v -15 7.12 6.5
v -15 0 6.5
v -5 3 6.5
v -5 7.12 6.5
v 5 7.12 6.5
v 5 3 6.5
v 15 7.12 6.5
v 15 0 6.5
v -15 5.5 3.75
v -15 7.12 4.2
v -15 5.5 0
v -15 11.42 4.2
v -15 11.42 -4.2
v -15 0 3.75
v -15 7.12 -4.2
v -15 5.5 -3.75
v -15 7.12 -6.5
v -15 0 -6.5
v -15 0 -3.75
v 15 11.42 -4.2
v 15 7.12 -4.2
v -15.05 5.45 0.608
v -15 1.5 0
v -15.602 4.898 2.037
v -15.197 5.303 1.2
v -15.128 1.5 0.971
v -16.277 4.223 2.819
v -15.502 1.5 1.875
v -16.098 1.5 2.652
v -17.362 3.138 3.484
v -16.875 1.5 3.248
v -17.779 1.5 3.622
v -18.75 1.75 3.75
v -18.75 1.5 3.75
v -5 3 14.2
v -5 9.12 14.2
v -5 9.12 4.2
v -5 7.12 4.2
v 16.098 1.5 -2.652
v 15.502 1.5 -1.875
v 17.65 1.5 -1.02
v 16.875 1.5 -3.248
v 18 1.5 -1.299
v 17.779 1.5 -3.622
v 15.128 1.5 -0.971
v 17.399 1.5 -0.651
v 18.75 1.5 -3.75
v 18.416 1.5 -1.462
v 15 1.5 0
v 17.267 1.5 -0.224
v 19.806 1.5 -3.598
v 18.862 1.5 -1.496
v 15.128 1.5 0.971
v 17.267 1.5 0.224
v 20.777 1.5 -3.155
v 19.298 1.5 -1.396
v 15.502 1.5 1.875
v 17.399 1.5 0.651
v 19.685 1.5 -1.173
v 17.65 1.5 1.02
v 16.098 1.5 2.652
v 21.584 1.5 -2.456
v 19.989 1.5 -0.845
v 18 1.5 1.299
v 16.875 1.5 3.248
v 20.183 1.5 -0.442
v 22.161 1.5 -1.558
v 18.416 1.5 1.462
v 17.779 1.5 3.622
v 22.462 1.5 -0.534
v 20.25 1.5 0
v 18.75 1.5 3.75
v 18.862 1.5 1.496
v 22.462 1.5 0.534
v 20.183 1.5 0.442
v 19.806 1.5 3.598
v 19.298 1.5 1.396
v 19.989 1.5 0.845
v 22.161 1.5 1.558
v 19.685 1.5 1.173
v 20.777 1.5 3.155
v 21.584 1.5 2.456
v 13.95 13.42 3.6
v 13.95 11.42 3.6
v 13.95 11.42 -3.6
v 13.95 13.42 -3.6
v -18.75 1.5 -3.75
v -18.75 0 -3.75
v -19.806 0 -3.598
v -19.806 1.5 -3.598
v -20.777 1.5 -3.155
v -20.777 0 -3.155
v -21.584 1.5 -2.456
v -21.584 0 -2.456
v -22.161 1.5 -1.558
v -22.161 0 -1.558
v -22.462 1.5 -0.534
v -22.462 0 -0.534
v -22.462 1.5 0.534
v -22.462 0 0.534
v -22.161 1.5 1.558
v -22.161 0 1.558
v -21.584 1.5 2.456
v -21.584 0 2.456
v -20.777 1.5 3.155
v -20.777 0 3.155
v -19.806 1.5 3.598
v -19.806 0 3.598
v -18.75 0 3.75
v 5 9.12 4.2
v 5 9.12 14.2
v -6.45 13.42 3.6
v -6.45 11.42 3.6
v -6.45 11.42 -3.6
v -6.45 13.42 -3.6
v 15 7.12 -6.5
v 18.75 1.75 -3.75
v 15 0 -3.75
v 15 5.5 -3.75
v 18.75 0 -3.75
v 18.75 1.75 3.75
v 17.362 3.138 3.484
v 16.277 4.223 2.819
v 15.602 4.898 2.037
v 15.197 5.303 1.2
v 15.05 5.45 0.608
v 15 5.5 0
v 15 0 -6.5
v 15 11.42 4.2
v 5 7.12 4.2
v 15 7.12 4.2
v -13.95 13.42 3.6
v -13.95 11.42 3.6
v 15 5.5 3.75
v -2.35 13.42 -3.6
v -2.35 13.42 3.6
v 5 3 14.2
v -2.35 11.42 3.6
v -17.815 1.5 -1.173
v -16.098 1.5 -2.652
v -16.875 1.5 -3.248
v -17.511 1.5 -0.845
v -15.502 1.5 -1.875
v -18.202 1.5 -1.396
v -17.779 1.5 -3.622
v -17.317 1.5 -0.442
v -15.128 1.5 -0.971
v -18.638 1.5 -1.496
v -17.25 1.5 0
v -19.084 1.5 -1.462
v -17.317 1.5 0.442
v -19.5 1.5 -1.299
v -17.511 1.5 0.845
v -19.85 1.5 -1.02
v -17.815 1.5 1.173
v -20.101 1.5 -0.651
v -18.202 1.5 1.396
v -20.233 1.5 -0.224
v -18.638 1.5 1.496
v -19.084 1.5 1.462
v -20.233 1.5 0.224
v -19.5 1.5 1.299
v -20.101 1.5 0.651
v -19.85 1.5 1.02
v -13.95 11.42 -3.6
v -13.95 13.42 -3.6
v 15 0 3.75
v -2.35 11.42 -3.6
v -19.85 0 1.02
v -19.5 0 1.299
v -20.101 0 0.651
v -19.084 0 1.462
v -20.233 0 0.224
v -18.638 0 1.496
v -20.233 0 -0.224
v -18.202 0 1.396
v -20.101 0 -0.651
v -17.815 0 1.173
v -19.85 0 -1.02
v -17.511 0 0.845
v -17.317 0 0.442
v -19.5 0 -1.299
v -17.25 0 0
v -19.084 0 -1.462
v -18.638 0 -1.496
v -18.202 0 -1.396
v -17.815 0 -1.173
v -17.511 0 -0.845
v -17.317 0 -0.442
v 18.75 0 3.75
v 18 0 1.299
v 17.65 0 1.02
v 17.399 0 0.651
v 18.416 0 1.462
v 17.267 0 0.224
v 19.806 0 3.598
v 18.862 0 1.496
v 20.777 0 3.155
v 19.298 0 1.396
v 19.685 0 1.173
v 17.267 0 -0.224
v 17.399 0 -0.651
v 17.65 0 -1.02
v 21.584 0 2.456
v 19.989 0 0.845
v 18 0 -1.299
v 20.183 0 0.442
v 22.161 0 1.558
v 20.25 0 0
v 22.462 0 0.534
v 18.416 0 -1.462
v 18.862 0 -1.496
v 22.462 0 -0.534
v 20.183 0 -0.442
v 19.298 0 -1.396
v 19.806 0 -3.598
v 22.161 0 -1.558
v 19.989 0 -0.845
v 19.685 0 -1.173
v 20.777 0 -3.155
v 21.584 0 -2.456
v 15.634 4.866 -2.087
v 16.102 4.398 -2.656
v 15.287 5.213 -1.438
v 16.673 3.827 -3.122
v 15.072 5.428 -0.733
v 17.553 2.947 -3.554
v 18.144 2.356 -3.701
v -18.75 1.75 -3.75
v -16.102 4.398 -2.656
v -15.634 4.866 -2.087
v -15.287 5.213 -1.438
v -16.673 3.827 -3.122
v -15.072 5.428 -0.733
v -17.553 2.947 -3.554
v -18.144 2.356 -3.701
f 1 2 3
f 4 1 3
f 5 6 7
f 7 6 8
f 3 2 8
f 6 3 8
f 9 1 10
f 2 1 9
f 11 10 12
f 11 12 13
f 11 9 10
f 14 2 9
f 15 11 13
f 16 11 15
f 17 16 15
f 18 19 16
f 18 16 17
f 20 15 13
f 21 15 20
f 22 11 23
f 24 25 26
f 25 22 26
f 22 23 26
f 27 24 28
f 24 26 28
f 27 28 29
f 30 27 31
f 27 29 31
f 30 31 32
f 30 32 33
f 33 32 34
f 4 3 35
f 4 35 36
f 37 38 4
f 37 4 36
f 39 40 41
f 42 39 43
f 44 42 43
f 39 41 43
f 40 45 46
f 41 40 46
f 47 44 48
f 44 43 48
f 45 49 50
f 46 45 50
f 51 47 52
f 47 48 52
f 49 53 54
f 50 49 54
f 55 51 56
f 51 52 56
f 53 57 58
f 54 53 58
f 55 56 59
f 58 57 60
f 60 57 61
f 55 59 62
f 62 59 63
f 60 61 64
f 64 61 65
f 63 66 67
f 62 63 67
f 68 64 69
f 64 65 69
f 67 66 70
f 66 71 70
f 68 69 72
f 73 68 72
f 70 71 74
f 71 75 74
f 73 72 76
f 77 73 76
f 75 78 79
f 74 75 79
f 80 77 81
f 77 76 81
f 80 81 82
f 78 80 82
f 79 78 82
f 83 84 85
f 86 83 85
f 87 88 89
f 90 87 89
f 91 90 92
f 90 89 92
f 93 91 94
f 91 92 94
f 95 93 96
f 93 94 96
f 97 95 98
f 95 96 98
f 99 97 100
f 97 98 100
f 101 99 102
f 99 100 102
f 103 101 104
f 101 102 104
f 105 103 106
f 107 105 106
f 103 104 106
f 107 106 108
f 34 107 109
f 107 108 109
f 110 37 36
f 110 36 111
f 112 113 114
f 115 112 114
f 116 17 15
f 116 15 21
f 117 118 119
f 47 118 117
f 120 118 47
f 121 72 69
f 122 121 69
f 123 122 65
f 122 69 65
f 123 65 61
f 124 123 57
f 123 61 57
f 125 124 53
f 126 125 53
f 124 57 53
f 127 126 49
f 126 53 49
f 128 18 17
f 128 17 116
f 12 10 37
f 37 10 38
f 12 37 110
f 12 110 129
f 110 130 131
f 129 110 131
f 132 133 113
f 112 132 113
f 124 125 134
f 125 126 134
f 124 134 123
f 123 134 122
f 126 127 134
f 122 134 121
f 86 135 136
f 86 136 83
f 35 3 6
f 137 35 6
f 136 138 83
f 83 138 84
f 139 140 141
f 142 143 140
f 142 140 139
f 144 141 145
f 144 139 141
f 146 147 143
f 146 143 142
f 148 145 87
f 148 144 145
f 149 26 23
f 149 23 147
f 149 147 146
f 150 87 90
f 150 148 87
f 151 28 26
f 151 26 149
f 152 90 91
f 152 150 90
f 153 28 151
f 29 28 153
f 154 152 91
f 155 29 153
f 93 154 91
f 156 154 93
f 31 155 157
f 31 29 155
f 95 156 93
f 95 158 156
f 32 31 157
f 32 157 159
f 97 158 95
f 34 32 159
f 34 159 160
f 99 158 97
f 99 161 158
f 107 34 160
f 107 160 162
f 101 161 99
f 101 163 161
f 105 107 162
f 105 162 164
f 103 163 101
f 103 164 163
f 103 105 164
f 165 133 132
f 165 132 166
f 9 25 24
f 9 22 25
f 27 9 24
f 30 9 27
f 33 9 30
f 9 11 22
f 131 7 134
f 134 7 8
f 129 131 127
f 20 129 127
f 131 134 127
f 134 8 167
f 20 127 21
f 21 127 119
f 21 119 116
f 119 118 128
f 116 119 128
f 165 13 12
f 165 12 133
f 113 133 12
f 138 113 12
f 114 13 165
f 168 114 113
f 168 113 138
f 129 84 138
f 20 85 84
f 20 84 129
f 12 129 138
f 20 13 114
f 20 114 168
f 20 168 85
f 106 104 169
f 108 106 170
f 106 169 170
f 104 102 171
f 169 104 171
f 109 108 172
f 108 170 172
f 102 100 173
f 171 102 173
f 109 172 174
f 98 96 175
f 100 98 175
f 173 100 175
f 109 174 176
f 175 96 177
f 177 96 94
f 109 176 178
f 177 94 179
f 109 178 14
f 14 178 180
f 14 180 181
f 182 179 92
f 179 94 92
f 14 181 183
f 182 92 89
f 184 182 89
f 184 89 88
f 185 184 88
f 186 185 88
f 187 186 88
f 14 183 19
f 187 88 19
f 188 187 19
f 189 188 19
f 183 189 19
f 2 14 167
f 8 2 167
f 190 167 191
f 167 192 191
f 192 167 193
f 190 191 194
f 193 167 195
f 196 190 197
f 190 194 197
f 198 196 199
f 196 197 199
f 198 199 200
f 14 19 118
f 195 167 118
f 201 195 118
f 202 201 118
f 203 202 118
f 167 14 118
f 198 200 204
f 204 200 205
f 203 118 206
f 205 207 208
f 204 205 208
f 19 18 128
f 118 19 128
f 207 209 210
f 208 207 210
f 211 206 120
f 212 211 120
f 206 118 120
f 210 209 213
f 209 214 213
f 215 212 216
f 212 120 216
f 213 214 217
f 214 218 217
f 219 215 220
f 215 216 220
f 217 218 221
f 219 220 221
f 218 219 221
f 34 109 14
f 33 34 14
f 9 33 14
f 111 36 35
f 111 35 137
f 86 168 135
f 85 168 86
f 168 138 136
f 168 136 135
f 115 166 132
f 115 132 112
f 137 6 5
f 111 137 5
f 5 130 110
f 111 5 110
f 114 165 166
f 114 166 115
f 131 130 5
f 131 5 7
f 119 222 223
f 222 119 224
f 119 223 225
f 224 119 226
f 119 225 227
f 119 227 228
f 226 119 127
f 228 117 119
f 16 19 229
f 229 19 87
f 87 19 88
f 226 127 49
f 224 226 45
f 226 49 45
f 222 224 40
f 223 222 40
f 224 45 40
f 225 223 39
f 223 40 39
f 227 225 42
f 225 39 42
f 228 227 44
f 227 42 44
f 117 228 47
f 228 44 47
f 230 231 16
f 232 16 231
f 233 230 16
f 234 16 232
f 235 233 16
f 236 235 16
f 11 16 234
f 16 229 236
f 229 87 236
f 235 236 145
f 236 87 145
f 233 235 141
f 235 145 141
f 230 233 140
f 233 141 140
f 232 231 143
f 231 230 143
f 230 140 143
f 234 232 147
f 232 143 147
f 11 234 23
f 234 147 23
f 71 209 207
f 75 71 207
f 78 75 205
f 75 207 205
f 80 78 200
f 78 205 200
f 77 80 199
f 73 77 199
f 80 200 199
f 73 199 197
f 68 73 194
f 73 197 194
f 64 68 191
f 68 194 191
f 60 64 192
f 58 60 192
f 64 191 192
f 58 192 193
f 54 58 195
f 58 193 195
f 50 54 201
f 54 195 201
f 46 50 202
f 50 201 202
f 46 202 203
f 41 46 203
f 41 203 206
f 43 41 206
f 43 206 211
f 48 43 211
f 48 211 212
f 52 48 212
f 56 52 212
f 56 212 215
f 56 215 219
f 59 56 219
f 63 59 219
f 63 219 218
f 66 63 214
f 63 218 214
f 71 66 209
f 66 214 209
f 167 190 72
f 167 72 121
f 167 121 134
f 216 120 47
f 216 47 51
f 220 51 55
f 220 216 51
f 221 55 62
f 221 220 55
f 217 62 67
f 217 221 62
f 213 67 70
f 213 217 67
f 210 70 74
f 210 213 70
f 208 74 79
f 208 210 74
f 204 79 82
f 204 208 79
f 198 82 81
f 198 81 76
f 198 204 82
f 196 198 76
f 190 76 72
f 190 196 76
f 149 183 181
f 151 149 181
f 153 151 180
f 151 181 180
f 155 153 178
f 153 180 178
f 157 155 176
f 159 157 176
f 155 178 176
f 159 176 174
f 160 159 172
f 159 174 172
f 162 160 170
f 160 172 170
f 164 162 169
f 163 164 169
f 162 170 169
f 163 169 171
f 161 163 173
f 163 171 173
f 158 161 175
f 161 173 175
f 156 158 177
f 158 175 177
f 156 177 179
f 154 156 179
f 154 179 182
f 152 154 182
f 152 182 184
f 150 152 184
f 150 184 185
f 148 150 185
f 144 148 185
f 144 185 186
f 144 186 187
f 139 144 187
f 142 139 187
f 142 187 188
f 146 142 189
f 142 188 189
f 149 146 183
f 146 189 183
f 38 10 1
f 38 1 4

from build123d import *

# Parameters (mm, degrees)
SKETCH1_W            = 30
SKETCH1_H            = 13
BOTTOMPLATEAU_DEPTH  = 7.12
SKETCH3_R            = 1.5
SCREWSOCKETS_DEPTH   = 1.5
SKETCH4_W            = 30
SKETCH4_H            = 8.4
TOPPLATEAU_DEPTH     = 4.3
SKETCH5_W            = 7.5
SKETCH5_H            = 7.2
SKETCH5_W_2          = 16.3
SENSORSOCKETS_DEPTH  = 2
EXTRUDEDSLANTS_DEPTH = 4
F_45SLANTS_DEPTH     = 7.5
CONNECTION_W         = 10
CONNECTION_H         = 6.12
BOSS_EXTRUDE6_DEPTH  = 10


with BuildPart() as part:
    # Sketch1 → BottomPlateau (new body)
    with BuildSketch(Plane(origin=(0, 0, 0), x_dir=(1, 0, 0), z_dir=(0, 1, 0))):
        Rectangle(SKETCH1_W, SKETCH1_H)
    extrude(amount=BOTTOMPLATEAU_DEPTH)

    # Sketch3 → ScrewSockets (add)
    with BuildSketch(Plane.XZ):
        with BuildLine():
            Line((-18.75, 3.75), (-15, 3.75))
            Line((-15, 3.75), (-15, -3.75))
            Line((-15, -3.75), (-18.75, -3.75))
            ThreePointArc((-18.75, -3.75), (-22.5, 0), (-18.75, 3.75))
        make_face()
        with Locations((-18.75, 0)):
            Circle(SKETCH3_R, mode=Mode.SUBTRACT)
        with BuildLine():
            Line((18.75, 3.75), (15, 3.75))
            Line((15, 3.75), (15, -3.75))
            Line((15, -3.75), (18.75, -3.75))
            ThreePointArc((18.75, -3.75), (22.5, 0), (18.75, 3.75))
        make_face()
        with Locations((18.75, 0)):
            Circle(SKETCH3_R, mode=Mode.SUBTRACT)
    extrude(amount=-SCREWSOCKETS_DEPTH)

    # Sketch4 → TopPlateau (add)
    with BuildSketch(Plane(origin=(0, 7.12, 0), x_dir=(1, 0, 0), z_dir=(0, 1, 0))):
        Rectangle(SKETCH4_W, SKETCH4_H)
    extrude(amount=TOPPLATEAU_DEPTH)

    # Sketch5 → SensorSockets (add)
    with BuildSketch(Plane(origin=(0, 11.42, 0), x_dir=(1, 0, 0), z_dir=(0, 1, 0))):
        with Locations((-10.2, 0)):
            Rectangle(SKETCH5_W, SKETCH5_H)
        with Locations((5.8, 0)):
            Rectangle(SKETCH5_W_2, SKETCH5_H)
    extrude(amount=SENSORSOCKETS_DEPTH)

    # Sketch6 → ExtrudedSlants (add)
    with BuildSketch(Plane(origin=(0, 1.5, 0), x_dir=(1, 0, 0), z_dir=(0, 1, 0))):
        with BuildLine():
            Line((-15, -3.75), (-15, 0))
            ThreePointArc((-15, 0), (-16.098349571, -2.651650429), (-18.75, -3.75))
            Line((-18.75, -3.75), (-15, -3.75))
        make_face()
        with BuildLine():
            Line((-15, 3.75), (-18.75, 3.75))
            ThreePointArc((-18.75, 3.75), (-16.098349571, 2.651650429), (-15, 0))
            Line((-15, 0), (-15, 3.75))
        make_face()
        with BuildLine():
            ThreePointArc((15, 6e-09), (16.098349573, 2.651650432), (18.75, 3.75))
            Line((18.75, 3.75), (15, 3.75))
            Line((15, 3.75), (15, 6e-09))
        make_face()
        with BuildLine():
            ThreePointArc((18.75, -3.75), (16.098349568, -2.651650427), (15, 6e-09))
            Line((15, 6e-09), (15, -3.75))
            Line((15, -3.75), (18.75, -3.75))
        make_face()
    extrude(amount=EXTRUDEDSLANTS_DEPTH)

    # Sketch7 → 45Slants (cut)
    with BuildSketch(Plane.XY.offset(3.75)):
        Polygon((-15, 5.5), (-18.75, 1.75), (-18.75, 5.5), align=None)
        Polygon((15, 5.5), (18.75, 1.75), (18.75, 5.5), align=None)
    extrude(amount=-F_45SLANTS_DEPTH, mode=Mode.SUBTRACT)

    # Connection → Boss-Extrude6 (add)
    with BuildSketch(Plane.XY.offset(4.2)):
        with Locations((0, 6.06)):
            Rectangle(CONNECTION_W, CONNECTION_H)
    extrude(amount=BOSS_EXTRUDE6_DEPTH)


solid = part.part
